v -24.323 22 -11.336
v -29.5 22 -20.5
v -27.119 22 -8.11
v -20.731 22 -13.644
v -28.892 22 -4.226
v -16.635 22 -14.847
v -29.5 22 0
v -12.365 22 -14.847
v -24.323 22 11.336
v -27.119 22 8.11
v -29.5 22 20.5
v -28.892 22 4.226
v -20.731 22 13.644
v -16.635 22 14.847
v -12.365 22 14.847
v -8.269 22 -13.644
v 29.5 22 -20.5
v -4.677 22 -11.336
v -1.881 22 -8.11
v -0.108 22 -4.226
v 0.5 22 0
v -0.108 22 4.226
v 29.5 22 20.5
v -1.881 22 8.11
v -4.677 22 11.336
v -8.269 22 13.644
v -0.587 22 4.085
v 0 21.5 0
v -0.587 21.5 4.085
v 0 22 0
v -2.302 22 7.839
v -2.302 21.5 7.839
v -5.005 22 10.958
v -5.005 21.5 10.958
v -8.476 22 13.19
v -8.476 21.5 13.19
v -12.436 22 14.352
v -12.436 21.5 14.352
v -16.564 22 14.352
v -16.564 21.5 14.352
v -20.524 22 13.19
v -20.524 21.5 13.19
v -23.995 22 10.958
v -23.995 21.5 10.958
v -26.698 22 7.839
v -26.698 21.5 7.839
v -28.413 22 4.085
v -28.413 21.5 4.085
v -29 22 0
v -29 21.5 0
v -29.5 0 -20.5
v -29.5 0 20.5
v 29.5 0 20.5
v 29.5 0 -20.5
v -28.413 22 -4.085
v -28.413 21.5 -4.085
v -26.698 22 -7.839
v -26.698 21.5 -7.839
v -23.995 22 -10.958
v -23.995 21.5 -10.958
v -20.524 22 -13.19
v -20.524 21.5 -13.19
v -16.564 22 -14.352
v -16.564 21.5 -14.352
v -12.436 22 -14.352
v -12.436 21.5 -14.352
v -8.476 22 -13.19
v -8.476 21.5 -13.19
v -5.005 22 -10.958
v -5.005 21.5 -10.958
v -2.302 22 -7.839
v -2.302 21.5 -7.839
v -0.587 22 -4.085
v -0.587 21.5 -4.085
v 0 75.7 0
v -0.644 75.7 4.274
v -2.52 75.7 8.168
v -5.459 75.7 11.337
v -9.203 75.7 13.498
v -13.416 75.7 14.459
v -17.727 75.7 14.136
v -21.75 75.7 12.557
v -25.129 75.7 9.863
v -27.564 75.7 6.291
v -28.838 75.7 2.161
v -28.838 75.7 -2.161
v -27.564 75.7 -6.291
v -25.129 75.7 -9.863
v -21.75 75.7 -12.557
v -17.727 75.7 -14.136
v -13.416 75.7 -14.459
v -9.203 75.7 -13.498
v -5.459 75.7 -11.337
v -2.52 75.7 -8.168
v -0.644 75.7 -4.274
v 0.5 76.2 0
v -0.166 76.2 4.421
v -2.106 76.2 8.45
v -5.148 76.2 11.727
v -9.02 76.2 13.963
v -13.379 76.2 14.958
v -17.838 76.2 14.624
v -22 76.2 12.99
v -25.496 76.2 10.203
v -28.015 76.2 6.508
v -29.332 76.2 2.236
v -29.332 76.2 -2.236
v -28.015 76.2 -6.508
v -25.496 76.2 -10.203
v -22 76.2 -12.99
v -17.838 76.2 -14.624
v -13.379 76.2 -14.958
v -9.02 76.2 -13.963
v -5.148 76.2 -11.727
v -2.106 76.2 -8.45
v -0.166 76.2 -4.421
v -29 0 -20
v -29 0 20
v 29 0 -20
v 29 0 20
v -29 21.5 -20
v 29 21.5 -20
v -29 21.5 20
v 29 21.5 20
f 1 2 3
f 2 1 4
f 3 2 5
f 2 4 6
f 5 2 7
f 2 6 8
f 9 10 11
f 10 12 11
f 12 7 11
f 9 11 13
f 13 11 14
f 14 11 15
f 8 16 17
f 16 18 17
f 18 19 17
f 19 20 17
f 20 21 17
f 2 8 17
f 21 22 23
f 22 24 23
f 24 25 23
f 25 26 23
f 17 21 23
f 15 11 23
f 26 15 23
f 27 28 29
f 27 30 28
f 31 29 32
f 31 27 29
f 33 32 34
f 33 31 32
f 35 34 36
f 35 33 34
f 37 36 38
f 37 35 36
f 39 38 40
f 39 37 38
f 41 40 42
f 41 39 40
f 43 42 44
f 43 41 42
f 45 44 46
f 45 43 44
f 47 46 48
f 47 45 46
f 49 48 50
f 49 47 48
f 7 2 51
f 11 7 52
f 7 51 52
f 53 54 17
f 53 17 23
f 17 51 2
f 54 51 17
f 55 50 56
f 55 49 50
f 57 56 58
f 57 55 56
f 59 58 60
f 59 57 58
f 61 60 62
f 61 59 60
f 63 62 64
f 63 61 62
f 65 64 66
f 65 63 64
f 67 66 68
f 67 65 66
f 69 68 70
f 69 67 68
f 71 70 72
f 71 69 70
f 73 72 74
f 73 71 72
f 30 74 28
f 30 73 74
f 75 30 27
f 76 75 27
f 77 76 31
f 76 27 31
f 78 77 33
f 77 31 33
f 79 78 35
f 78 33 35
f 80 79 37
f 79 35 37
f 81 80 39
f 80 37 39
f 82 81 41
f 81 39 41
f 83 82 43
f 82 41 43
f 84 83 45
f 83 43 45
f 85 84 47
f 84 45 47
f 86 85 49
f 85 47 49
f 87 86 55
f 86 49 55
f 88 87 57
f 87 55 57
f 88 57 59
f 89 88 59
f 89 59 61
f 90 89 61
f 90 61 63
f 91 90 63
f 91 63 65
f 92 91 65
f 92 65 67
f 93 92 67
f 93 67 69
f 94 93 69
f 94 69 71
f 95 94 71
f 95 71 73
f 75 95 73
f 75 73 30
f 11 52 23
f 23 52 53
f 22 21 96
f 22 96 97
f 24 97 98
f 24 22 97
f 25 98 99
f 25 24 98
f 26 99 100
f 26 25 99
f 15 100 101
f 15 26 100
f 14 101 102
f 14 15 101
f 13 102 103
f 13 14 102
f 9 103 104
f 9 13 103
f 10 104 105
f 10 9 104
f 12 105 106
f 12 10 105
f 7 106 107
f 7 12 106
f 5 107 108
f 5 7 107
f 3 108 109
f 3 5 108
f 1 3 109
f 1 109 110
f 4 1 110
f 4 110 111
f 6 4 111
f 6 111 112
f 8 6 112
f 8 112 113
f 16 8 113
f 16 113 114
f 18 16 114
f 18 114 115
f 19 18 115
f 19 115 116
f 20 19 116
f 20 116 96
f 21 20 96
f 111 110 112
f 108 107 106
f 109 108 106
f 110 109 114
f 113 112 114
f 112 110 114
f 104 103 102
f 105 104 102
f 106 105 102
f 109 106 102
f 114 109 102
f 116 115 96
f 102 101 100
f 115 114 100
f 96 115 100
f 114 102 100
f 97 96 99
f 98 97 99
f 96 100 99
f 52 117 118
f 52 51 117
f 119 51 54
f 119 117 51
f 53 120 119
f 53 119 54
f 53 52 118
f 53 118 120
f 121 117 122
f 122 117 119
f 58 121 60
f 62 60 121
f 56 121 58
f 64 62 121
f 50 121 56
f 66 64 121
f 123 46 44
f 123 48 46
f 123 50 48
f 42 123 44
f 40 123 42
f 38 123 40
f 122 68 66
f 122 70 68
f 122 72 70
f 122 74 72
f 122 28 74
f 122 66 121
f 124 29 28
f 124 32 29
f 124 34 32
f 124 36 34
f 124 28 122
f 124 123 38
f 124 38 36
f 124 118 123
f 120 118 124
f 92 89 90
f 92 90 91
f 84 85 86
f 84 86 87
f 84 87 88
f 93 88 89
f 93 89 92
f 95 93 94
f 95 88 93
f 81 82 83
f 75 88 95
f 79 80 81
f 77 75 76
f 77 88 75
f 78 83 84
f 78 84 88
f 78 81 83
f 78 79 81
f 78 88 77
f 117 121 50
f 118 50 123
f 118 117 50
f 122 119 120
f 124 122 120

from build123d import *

# Parameters (mm, degrees)
F0_W        = 59
F0_H        = 41
F1_DEPTH    = 22
F2_R        = 15
F3_DEPTH    = 76.2
F4_T        = 0.5
F4_T4_ANGLE = 180.000000001
F4_T6_ANGLE = 180.000000001


# Not quite as in the source:
# - a shell that OpenCascade refuses in one call is made with other operations: the cavity is built on its own and cut out


with BuildPart() as f1:
    # F0 (on Front) → F1 (new body)
    with BuildSketch(Plane.XZ):
        Rectangle(F0_W, F0_H)
    extrude(amount=-F1_DEPTH)

    # F2 (on Front) → F3 (join)
    with BuildSketch(Plane.XZ):
        with Locations((-14.5, 0)):
            Circle(F2_R)
    extrude(amount=-F3_DEPTH)

    # F4: shell of thickness 0.5, made by hand


with BuildPart() as f4_core1:
    # F4_t2: copy of F1
    add(f1.part)

    # the walls: a layer under each face that stays
    f4_faces = [f4_core1.faces().sort_by_distance(p)[0] for p in [
        (29.5, 11, 0),
        (0, 22, -13.6666666667),
        (-29.5, 49.1, 0),
        (-14.5, 76.2, 0),
        (-29.5, 11, 0),
        (0, 11, 20.5),
        (0, 11, -20.5),
    ]]
    thicken(f4_faces, amount=-F4_T, mode=Mode.SUBTRACT)

    # F4_s3 → F4_t4 (revolve, cut)
    with BuildSketch(Plane.XY):
        Polygon((-29.505, 22.005), (-29.5, 21.5), (-29, 21.5), (-29, 22), align=None)
    revolve(axis=Axis((-14.5, 22, 0), (0, -1, 0)), revolution_arc=F4_T4_ANGLE, mode=Mode.SUBTRACT)

    # F4_s5 → F4_t6 (revolve, cut)
    with BuildSketch(Plane.XY):
        Polygon((0.505, 22.005), (0.5, 21.5), (0, 21.5), (0, 22), align=None)
    revolve(axis=Axis((-14.5, 22, 0), (0, -1, 0)), revolution_arc=F4_T6_ANGLE, mode=Mode.SUBTRACT)


with BuildPart() as f1_1:
    add(f1.part)

    # what is left inside the walls is the cavity
    f4_cavity = [f4_core1.part.solids().sort_by_distance(p)[0] for p in [
        (-28.995, 57.8, 0),
    ]]
    add(f4_cavity, mode=Mode.SUBTRACT)


solid = f1_1.part
